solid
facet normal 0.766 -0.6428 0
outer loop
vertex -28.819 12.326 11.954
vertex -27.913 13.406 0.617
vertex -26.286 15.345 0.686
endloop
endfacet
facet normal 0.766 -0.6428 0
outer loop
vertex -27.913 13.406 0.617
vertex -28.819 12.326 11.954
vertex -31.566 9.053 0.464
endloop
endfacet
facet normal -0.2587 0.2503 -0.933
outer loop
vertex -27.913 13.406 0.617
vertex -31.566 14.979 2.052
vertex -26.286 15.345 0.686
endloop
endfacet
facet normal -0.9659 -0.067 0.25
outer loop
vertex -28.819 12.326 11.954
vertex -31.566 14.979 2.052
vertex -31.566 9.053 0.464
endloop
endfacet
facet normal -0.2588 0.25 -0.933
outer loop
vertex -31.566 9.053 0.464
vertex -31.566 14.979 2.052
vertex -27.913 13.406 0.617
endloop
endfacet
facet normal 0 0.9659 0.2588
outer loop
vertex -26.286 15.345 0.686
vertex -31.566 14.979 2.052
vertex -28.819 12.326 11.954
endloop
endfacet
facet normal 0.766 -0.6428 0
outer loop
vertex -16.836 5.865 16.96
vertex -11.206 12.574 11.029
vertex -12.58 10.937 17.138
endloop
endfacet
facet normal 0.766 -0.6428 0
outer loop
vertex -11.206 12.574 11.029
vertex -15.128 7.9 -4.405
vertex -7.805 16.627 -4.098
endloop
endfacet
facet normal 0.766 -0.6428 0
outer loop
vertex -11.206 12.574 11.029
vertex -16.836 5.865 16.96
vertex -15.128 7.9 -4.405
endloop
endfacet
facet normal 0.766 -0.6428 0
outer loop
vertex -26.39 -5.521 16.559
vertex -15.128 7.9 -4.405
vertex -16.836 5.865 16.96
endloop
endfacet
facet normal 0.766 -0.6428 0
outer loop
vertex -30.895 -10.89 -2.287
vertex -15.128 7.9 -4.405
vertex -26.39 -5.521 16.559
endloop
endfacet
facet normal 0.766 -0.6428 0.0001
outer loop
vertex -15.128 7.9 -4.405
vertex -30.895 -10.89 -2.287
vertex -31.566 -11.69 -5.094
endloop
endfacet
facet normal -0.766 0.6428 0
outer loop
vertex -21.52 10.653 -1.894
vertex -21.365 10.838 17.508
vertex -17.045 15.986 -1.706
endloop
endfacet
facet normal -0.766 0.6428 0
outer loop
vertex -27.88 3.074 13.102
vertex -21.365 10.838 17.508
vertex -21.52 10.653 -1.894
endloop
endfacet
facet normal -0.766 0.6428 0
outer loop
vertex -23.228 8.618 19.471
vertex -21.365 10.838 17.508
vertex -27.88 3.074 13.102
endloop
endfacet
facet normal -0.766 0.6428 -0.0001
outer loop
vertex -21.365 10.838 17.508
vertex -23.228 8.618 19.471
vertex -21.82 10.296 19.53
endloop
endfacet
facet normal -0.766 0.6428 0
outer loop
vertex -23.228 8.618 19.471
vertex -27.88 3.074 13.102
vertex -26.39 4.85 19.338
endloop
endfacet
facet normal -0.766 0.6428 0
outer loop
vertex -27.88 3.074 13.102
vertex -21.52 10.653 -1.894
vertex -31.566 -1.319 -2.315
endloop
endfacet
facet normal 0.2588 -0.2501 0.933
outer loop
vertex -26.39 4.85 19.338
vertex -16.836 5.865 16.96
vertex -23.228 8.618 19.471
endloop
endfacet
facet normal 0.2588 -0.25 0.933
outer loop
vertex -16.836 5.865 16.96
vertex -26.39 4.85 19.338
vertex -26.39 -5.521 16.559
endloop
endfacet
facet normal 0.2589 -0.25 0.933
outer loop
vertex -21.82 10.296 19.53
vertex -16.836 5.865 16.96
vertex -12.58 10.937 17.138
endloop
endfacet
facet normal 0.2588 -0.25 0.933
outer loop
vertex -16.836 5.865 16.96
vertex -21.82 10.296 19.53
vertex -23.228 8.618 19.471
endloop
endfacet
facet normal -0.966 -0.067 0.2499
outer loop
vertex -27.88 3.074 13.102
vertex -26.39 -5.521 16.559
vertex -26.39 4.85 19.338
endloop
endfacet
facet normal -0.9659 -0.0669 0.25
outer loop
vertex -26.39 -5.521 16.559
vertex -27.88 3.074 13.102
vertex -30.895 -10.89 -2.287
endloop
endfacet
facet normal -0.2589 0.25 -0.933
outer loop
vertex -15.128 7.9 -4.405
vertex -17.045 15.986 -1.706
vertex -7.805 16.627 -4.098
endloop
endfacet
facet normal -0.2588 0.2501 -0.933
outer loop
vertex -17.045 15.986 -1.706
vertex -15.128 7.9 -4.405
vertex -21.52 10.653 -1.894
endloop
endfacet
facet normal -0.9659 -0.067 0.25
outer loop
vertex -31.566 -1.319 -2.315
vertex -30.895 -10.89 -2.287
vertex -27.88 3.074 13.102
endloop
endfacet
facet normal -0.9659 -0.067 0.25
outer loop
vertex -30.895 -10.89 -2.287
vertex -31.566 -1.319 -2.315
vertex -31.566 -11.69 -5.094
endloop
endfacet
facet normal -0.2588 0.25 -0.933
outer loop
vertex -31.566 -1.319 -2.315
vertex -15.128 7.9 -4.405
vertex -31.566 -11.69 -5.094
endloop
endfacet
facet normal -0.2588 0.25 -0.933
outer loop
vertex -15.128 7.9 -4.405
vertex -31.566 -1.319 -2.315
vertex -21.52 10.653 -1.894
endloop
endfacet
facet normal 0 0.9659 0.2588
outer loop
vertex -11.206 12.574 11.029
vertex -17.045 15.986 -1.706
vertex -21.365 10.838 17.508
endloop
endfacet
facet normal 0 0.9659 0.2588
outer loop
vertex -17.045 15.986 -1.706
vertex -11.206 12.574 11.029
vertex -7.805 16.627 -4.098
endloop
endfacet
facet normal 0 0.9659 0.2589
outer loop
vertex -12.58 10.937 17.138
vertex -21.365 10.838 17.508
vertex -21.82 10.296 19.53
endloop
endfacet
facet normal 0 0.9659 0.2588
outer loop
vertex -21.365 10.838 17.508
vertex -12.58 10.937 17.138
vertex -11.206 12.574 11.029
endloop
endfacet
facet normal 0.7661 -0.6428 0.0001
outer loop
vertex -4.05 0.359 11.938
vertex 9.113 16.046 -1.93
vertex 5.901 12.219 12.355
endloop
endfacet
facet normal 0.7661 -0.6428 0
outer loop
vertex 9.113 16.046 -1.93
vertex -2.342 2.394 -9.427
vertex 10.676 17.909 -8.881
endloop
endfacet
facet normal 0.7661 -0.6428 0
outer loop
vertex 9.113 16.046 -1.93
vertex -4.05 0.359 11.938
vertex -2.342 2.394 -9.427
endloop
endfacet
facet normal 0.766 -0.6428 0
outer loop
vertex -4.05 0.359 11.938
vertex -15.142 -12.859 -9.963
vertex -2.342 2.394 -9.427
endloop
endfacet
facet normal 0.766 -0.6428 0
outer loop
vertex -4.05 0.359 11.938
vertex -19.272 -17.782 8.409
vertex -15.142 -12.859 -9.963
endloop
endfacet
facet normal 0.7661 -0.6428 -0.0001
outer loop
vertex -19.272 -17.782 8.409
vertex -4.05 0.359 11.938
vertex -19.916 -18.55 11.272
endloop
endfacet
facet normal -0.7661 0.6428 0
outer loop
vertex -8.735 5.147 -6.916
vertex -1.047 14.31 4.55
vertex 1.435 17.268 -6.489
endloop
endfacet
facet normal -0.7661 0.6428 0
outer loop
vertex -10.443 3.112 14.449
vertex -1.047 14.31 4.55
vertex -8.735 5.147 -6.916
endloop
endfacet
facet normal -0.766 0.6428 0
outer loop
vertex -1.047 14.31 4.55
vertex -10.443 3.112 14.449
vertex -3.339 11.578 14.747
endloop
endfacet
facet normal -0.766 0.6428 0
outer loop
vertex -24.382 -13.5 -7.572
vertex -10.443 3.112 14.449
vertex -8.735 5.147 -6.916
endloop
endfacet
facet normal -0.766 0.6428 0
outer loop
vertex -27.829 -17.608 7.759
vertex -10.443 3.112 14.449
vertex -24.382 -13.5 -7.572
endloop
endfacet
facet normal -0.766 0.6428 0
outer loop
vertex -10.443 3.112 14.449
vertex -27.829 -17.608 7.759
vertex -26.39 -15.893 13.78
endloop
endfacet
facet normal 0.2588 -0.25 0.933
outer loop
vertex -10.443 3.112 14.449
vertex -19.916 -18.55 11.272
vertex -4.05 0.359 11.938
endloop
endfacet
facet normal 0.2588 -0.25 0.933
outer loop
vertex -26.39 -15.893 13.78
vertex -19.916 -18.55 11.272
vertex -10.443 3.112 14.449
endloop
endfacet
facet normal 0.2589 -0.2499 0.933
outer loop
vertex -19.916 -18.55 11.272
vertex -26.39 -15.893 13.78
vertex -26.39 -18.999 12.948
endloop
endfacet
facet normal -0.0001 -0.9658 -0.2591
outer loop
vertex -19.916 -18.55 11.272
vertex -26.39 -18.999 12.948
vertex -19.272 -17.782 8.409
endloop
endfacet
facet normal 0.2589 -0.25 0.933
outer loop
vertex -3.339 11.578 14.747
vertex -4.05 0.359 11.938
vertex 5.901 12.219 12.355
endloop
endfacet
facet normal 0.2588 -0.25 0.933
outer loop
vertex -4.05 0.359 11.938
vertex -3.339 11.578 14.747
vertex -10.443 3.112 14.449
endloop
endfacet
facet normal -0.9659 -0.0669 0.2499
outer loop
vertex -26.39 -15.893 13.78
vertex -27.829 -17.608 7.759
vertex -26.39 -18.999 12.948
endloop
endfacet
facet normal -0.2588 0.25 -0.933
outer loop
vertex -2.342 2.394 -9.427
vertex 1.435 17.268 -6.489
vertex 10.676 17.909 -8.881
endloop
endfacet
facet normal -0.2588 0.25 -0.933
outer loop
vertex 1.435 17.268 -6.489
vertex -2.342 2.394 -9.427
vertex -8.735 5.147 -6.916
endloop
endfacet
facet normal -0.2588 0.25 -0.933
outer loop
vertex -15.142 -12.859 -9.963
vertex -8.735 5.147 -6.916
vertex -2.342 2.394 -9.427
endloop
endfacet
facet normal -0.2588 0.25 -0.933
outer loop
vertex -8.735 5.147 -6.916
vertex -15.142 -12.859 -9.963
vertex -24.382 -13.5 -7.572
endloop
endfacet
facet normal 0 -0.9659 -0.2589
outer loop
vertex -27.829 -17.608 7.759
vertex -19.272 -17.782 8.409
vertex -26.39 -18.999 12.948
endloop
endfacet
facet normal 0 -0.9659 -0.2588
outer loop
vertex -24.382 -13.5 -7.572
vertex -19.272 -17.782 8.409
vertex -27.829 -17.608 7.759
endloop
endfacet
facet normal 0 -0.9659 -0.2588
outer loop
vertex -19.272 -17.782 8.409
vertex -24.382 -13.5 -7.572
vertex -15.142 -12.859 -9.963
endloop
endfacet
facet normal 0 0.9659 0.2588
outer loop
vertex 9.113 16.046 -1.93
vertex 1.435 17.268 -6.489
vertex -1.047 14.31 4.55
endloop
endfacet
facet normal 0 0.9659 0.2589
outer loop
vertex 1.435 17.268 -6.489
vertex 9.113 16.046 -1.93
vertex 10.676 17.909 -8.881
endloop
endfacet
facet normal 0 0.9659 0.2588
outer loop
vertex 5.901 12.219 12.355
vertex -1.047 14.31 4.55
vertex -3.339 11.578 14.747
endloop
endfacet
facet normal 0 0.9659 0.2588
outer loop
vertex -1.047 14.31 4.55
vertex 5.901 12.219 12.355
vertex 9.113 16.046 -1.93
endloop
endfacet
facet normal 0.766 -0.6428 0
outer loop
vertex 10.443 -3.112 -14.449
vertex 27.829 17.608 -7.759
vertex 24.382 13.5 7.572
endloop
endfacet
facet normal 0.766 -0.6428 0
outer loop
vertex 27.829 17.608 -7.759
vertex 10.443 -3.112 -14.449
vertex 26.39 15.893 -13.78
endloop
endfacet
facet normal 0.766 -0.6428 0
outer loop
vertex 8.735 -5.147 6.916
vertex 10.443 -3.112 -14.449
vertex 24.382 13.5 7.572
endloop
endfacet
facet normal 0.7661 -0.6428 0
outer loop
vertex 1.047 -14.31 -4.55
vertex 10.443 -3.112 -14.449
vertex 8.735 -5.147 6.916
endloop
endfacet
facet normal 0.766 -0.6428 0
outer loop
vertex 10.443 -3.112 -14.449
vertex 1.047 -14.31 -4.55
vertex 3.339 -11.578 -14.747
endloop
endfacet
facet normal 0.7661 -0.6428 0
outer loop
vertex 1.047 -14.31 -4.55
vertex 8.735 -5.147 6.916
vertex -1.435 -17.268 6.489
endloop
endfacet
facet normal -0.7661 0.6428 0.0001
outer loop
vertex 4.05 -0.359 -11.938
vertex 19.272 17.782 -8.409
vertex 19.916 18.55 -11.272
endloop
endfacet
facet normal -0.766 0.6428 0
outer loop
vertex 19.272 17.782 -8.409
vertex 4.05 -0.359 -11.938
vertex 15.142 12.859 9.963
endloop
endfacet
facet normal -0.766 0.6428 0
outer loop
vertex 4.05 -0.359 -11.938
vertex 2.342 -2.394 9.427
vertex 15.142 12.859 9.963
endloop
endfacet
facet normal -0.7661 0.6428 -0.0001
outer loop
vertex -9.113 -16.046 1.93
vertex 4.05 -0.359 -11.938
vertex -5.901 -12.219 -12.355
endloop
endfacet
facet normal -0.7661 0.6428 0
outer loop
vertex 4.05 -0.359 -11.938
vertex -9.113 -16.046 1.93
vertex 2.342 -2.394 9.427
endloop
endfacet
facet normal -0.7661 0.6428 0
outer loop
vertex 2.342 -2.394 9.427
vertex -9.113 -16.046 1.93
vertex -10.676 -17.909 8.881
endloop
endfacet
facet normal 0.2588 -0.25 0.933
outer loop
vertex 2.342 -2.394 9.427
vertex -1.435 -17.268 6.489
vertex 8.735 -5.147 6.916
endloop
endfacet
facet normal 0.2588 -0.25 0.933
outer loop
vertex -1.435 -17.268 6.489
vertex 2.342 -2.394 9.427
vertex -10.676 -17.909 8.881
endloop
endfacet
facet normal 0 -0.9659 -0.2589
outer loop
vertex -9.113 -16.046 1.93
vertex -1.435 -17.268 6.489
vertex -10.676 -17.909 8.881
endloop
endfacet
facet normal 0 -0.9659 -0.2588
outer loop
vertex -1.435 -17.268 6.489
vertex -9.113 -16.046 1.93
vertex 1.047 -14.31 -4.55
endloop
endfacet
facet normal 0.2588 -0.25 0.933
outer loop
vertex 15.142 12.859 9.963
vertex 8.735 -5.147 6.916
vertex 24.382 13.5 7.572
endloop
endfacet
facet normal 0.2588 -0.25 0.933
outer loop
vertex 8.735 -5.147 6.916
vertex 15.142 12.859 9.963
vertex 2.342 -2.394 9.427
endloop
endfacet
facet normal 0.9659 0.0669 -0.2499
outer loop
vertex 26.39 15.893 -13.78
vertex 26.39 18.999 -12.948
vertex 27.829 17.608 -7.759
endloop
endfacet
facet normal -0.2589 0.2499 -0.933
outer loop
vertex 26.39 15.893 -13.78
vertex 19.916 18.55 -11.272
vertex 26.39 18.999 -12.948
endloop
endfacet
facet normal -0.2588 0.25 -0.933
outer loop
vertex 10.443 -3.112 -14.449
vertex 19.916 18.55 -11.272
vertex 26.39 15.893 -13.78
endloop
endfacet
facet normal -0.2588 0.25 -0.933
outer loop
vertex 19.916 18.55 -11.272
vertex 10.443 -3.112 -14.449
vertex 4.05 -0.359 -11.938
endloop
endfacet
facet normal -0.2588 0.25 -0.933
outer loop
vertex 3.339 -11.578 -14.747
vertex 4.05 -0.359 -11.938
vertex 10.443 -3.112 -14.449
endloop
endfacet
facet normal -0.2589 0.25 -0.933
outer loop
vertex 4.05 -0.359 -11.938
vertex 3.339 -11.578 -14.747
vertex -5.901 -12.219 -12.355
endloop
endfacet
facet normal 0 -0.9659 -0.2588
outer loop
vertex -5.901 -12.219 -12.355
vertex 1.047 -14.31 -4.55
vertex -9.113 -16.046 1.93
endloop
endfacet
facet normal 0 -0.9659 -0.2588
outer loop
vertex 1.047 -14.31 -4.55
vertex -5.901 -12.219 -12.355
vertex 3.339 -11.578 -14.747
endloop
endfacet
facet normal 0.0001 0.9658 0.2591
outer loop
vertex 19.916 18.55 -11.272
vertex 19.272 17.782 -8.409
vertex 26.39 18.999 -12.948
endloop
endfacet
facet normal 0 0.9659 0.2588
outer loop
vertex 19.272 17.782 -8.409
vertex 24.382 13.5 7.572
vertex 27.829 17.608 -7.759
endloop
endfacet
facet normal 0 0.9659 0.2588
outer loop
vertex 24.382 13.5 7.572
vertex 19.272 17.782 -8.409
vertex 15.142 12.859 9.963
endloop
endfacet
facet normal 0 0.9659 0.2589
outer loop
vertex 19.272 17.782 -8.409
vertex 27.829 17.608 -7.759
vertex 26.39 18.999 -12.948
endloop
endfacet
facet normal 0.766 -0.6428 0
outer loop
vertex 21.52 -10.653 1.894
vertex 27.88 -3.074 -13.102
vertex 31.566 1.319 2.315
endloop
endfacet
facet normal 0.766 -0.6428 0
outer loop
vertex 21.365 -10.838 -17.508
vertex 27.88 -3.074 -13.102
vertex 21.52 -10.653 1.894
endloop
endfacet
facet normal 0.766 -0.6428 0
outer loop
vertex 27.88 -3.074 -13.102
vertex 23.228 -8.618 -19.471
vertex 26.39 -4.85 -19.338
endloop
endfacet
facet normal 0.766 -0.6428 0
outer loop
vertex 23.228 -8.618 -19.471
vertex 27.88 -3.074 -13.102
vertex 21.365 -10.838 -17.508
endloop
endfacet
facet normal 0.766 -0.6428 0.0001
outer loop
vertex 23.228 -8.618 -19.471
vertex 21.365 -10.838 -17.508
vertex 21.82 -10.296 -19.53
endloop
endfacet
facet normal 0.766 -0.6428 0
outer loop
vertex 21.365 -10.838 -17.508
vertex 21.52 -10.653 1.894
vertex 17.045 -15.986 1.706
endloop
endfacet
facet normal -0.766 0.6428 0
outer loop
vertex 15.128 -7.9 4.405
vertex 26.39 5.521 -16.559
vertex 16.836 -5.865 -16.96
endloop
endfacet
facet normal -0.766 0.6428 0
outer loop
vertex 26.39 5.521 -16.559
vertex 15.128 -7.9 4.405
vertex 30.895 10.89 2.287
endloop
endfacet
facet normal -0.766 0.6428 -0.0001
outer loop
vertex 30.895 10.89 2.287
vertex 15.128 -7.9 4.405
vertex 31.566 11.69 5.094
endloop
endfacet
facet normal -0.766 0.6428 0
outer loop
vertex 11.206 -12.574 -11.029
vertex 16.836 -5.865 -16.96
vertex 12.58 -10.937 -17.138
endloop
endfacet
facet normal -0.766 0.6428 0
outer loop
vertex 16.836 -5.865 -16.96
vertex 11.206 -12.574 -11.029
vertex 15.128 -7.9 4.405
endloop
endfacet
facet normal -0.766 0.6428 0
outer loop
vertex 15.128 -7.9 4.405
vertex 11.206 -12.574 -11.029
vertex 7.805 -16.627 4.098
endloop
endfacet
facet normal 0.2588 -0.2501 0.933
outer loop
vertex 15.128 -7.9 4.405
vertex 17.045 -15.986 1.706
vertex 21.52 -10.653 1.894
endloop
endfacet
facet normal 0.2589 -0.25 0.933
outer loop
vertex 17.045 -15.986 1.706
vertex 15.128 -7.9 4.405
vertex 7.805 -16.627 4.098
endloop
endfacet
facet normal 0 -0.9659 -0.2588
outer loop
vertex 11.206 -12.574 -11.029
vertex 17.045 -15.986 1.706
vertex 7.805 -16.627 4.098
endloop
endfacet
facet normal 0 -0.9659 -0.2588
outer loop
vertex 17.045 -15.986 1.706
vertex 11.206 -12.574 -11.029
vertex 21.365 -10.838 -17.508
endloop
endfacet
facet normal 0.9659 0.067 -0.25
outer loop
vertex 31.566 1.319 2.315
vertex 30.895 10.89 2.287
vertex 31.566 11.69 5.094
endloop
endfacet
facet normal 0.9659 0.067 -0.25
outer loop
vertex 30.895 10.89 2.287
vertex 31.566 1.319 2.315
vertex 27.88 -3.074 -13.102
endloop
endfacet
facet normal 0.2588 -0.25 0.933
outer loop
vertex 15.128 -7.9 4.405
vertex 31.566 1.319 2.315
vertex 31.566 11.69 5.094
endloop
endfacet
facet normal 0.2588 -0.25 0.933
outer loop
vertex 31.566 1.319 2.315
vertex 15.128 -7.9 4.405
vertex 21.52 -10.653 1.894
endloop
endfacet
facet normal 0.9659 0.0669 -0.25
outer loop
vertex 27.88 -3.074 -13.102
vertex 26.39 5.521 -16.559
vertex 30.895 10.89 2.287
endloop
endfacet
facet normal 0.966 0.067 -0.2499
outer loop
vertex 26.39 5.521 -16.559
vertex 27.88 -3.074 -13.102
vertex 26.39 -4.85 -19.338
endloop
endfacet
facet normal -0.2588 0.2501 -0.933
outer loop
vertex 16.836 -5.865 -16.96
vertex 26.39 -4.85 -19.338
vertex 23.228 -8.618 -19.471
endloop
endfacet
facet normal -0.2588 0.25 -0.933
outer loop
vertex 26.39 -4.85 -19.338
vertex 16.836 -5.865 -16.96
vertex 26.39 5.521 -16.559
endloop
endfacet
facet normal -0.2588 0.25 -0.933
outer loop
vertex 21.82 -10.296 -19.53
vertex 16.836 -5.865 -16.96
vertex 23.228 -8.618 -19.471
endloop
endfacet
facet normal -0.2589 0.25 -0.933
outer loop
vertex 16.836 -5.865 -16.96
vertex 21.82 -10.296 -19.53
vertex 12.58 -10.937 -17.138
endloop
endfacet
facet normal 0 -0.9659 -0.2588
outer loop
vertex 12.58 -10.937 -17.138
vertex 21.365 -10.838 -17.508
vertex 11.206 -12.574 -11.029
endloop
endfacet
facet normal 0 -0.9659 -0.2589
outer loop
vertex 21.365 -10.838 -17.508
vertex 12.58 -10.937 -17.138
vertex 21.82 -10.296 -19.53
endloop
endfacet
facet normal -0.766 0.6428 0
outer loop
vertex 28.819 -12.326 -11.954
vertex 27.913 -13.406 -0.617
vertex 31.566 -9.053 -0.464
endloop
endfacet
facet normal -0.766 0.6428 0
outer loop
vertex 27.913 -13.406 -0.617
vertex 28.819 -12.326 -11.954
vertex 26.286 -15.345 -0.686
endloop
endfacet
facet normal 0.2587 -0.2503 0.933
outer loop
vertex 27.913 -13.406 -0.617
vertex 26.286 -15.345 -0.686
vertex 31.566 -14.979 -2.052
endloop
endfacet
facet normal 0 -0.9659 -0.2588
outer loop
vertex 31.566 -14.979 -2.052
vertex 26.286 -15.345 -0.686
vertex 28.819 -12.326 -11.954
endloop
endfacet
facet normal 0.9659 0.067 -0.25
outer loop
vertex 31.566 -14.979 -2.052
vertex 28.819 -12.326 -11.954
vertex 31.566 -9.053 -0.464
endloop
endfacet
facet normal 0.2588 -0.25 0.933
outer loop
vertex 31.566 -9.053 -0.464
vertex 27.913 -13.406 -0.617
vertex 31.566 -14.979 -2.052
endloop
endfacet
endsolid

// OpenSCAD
union(){
  // slice 0
  rotate(a=[0, 0, -40])
    intersection(){
      translate(v=[-50, 0, 0])
        translate(v=[0, -500, -500])
          cube(size=[6.666666666666664, 1000, 1000]);
      rotate(a=[0, 0, 40])
        rotate(a=[15, 0, 0])
          rotate(a=[0, 15, 0])
            translate(v=[-30, -15, -10])
              cube(size=[60, 30, 20]);
    }
  // slice 2
  rotate(a=[0, 0, -40])
    intersection(){
      translate(v=[-36.666666666666664, 0, 0])
        translate(v=[0, -500, -500])
          cube(size=[6.666666666666664, 1000, 1000]);
      rotate(a=[0, 0, 40])
        rotate(a=[15, 0, 0])
          rotate(a=[0, 15, 0])
            translate(v=[-30, -15, -10])
              cube(size=[60, 30, 20]);
    }
  // slice 4
  rotate(a=[0, 0, -40])
    intersection(){
      translate(v=[-23.333333333333332, 0, 0])
        translate(v=[0, -500, -500])
          cube(size=[6.666666666666668, 1000, 1000]);
      rotate(a=[0, 0, 40])
        rotate(a=[15, 0, 0])
          rotate(a=[0, 15, 0])
            translate(v=[-30, -15, -10])
              cube(size=[60, 30, 20]);
    }
  // slice 6
  rotate(a=[0, 0, -40])
    intersection(){
      translate(v=[-10, 0, 0])
        translate(v=[0, -500, -500])
          cube(size=[6.666666666666671, 1000, 1000]);
      rotate(a=[0, 0, 40])
        rotate(a=[15, 0, 0])
          rotate(a=[0, 15, 0])
            translate(v=[-30, -15, -10])
              cube(size=[60, 30, 20]);
    }
  // slice 8
  rotate(a=[0, 0, -40])
    intersection(){
      translate(v=[3.3333333333333357, 0, 0])
        translate(v=[0, -500, -500])
          cube(size=[6.666666666666664, 1000, 1000]);
      rotate(a=[0, 0, 40])
        rotate(a=[15, 0, 0])
          rotate(a=[0, 15, 0])
            translate(v=[-30, -15, -10])
              cube(size=[60, 30, 20]);
    }
  // slice 10
  rotate(a=[0, 0, -40])
    intersection(){
      translate(v=[16.66666666666667, 0, 0])
        translate(v=[0, -500, -500])
          cube(size=[6.666666666666671, 1000, 1000]);
      rotate(a=[0, 0, 40])
        rotate(a=[15, 0, 0])
          rotate(a=[0, 15, 0])
            translate(v=[-30, -15, -10])
              cube(size=[60, 30, 20]);
    }
  // slice 12
  rotate(a=[0, 0, -40])
    intersection(){
      translate(v=[30, 0, 0])
        translate(v=[0, -500, -500])
          cube(size=[6.666666666666671, 1000, 1000]);
      rotate(a=[0, 0, 40])
        rotate(a=[15, 0, 0])
          rotate(a=[0, 15, 0])
            translate(v=[-30, -15, -10])
              cube(size=[60, 30, 20]);
    }
  // slice 14
  rotate(a=[0, 0, -40])
    intersection(){
      translate(v=[43.33333333333334, 0, 0])
        translate(v=[0, -500, -500])
          cube(size=[6.666666666666657, 1000, 1000]);
      rotate(a=[0, 0, 40])
        rotate(a=[15, 0, 0])
          rotate(a=[0, 15, 0])
            translate(v=[-30, -15, -10])
              cube(size=[60, 30, 20]);
    }
}
